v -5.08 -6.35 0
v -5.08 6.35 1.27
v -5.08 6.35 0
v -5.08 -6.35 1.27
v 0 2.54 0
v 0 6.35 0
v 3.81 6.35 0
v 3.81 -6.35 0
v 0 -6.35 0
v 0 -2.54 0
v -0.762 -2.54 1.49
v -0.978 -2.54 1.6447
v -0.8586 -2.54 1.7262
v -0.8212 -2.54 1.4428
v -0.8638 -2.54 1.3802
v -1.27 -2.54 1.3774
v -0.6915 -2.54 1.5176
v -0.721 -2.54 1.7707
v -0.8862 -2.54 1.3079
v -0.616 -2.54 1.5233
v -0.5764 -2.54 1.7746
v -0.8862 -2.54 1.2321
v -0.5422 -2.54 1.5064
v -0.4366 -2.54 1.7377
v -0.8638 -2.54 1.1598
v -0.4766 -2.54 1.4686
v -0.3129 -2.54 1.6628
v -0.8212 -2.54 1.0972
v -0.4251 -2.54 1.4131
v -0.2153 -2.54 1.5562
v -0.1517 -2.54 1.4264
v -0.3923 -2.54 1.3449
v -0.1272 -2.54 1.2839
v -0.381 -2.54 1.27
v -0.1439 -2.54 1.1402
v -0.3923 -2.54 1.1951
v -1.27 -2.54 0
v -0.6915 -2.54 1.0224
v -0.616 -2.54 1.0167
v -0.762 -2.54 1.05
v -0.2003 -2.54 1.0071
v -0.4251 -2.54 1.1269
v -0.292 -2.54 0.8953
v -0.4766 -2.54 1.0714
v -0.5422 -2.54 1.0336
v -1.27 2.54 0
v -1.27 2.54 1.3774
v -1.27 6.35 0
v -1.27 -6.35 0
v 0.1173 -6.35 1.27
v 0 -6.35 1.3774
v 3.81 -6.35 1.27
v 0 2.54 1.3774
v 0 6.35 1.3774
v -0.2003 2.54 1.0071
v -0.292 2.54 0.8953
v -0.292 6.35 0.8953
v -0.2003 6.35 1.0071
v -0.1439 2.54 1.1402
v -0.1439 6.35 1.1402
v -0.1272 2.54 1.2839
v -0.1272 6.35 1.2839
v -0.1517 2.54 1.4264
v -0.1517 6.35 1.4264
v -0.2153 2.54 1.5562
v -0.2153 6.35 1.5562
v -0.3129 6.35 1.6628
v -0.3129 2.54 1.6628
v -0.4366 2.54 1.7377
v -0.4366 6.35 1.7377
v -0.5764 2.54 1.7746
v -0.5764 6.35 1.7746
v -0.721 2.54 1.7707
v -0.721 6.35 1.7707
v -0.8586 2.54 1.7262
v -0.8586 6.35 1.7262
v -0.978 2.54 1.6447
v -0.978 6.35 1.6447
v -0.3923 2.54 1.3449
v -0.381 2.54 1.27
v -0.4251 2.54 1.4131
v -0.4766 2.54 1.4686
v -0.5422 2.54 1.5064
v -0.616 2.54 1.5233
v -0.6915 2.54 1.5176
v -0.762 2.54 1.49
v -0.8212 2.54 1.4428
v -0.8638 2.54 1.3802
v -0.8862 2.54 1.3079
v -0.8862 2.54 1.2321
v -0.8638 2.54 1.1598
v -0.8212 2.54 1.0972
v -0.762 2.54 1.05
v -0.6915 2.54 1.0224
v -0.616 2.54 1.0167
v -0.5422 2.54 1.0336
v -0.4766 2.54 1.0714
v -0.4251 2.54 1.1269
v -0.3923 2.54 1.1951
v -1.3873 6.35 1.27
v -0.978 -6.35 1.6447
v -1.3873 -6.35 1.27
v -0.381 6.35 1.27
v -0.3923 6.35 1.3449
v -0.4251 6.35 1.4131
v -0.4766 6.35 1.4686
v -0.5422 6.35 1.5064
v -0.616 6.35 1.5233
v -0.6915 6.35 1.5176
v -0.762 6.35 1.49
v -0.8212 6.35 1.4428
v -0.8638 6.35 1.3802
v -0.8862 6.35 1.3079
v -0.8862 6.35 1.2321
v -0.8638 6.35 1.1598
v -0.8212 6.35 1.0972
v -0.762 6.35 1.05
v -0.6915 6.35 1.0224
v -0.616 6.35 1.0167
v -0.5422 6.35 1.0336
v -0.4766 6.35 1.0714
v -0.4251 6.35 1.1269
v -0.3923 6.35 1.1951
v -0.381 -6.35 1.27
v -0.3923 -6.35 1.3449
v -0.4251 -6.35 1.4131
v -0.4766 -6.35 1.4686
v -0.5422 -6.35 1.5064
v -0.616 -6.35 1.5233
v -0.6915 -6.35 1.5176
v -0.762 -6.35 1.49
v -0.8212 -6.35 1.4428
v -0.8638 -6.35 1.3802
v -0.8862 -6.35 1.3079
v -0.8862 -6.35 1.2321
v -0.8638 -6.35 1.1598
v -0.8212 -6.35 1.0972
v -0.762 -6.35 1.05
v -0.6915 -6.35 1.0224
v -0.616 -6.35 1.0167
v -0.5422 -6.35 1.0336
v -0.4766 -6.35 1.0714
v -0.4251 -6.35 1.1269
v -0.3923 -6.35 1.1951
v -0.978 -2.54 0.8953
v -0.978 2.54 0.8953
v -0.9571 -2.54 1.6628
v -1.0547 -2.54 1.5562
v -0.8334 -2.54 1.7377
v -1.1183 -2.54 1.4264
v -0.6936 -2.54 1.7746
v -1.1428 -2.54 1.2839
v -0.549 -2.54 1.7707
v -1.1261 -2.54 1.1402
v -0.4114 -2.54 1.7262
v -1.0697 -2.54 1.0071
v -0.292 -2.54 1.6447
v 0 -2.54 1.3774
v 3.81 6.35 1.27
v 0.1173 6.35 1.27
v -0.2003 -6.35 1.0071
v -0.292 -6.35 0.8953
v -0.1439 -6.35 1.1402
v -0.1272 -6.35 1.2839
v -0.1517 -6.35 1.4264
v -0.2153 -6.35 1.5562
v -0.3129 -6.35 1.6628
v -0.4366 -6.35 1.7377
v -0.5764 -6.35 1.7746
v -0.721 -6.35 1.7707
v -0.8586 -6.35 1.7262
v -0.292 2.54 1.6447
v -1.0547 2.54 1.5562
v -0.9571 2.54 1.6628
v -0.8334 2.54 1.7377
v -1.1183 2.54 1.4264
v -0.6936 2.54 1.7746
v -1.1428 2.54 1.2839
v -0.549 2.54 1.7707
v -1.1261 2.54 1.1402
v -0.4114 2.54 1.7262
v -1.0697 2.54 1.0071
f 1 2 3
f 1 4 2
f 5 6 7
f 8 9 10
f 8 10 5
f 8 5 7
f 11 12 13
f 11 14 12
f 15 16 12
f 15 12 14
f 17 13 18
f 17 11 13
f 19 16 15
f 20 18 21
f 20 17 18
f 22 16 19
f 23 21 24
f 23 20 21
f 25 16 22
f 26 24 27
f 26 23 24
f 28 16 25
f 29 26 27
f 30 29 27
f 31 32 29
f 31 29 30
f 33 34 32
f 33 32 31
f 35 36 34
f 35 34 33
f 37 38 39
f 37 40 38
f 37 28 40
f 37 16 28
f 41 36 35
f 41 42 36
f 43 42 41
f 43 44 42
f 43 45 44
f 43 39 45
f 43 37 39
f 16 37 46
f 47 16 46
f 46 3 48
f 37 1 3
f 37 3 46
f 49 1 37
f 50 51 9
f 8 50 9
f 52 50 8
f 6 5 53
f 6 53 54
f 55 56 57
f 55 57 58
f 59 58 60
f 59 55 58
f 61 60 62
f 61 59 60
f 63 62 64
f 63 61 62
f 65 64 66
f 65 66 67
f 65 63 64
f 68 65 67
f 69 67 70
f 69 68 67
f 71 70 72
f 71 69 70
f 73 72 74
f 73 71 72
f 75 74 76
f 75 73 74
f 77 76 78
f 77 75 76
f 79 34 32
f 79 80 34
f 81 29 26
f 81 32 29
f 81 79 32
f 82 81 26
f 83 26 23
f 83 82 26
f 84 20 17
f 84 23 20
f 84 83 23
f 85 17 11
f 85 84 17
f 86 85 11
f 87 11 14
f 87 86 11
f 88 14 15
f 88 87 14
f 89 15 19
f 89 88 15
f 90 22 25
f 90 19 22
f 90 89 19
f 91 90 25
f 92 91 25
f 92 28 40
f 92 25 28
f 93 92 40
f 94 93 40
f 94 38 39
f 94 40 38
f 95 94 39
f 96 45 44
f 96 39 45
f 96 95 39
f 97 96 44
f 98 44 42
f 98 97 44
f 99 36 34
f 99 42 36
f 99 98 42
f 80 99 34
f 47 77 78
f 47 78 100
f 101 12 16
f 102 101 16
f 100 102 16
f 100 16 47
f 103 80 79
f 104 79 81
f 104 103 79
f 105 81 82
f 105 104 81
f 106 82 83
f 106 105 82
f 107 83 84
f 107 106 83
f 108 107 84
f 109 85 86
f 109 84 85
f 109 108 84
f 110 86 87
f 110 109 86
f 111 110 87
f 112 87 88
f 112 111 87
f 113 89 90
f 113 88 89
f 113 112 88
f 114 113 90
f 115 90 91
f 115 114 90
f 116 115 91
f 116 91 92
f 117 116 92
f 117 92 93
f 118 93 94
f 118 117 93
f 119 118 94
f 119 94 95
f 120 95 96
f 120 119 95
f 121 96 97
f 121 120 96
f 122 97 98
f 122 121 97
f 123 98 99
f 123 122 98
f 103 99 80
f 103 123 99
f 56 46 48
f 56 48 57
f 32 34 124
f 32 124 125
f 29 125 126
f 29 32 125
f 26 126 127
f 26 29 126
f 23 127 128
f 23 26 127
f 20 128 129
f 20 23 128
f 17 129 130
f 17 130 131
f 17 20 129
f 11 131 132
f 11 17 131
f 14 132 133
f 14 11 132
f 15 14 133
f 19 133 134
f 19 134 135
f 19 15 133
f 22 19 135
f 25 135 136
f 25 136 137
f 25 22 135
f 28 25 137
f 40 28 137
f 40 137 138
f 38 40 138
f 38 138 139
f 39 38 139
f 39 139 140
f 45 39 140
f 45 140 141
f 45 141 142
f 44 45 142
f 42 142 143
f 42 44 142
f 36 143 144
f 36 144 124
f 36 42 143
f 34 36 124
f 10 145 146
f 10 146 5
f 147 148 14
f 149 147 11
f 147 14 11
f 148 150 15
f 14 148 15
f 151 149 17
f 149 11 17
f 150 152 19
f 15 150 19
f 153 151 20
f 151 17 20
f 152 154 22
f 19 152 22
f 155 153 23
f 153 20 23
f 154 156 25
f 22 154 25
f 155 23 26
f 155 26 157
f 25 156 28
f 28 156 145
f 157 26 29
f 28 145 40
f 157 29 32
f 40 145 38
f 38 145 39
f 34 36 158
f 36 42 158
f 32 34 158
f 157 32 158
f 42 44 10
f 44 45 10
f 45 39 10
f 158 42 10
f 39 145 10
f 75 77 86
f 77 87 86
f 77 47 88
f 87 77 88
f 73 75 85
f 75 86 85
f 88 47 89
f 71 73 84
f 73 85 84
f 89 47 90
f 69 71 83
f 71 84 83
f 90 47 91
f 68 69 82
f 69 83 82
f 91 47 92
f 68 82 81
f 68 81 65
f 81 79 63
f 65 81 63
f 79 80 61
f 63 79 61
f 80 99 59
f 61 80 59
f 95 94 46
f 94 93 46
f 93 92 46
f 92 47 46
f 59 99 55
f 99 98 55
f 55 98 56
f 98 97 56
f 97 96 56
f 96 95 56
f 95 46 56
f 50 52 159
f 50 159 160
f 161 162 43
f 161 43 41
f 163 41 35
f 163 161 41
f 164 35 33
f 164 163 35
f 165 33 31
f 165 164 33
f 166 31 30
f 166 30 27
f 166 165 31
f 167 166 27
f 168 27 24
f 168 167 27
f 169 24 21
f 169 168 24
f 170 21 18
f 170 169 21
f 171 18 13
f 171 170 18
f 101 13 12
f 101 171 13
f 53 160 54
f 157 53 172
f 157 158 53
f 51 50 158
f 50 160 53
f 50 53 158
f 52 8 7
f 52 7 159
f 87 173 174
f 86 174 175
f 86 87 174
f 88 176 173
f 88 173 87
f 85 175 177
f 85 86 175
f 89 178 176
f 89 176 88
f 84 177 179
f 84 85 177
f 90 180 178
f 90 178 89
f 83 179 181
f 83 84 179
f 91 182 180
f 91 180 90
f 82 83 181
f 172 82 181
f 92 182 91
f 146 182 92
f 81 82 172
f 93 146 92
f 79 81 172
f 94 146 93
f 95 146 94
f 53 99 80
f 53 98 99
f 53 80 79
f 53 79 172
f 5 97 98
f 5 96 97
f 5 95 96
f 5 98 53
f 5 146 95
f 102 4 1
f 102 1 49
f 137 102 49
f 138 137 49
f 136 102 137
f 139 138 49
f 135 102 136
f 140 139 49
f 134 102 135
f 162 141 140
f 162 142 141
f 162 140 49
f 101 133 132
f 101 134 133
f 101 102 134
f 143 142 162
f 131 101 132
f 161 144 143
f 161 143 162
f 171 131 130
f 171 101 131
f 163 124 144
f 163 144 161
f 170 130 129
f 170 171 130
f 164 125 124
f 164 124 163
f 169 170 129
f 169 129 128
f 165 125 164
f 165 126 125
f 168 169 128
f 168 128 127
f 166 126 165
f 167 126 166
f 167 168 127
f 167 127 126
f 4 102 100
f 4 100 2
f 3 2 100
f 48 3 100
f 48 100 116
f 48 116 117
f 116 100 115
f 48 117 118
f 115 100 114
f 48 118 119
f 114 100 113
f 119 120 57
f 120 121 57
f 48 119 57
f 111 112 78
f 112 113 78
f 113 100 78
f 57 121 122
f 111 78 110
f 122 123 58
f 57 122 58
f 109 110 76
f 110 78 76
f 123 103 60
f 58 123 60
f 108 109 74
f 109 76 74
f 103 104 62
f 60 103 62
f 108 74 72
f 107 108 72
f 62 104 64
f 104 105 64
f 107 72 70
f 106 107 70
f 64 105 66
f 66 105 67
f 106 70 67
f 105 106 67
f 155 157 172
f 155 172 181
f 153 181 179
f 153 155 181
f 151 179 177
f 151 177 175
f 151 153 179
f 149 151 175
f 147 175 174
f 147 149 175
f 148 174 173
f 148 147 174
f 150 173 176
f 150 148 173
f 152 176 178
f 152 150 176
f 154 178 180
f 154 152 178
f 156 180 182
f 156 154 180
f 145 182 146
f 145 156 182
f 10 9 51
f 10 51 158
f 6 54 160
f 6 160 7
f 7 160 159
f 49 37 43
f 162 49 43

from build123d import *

# Parameters (mm, degrees)
F0_R     = 0.254
F1_DEPTH = 6.35
F2_R     = 0.254
F3_DEPTH = 6.35
F4_W     = 1.27
F4_H     = 5.08
F5_DEPTH = 1.779
F4_H_2   = 6.35
F6_DEPTH = 1.779


with BuildPart() as f1:
    # F0 (on Front) → F1 (new body, symmetric)
    with BuildSketch(Plane.XZ):
        with BuildLine():
            Line((-0.9780140565, 0.8952929717), (0, 0))
            Line((0, 0), (3.81, 0))
            Line((3.81, 0), (3.81, 1.27))
            Line((3.81, 1.27), (0.117342346, 1.27))
            Line((0.117342346, 1.27), (-0.2919859435, 1.6447070283))
            ThreePointArc((-0.2919859435, 1.6447070283), (-0.1700725106, 1.4747105997), (-0.127, 1.27))
            ThreePointArc((-0.127, 1.27), (-0.4302894003, 0.8050725106), (-0.9780140565, 0.8952929717))
        make_face()
        with BuildLine():
            ThreePointArc((-0.2919859435, 1.6447070283), (-1.0097070283, 1.6130140565), (-0.9780140565, 0.8952929717))
            ThreePointArc((-0.9780140565, 0.8952929717), (-0.4302894003, 0.8050725106), (-0.127, 1.27))
            ThreePointArc((-0.127, 1.27), (-0.1700725106, 1.4747105997), (-0.2919859435, 1.6447070283))
        make_face()
        with Locations((-0.635, 1.27)):
            Circle(F0_R, mode=Mode.SUBTRACT)
    extrude(amount=F1_DEPTH, both=True)

    # F4 (on Top) → F6 (cut, through all)
    with BuildSketch(Plane.XY):
        with Locations((-0.635, 5.715)):
            Rectangle(F4_W, F4_H_2)
        with Locations((-0.635, -5.715)):
            Rectangle(F4_W, F4_H_2)
    extrude(amount=F6_DEPTH, mode=Mode.SUBTRACT)


with BuildPart() as f3:
    # F2 (on Front) → F3 (new body, symmetric)
    with BuildSketch(Plane.XZ):
        with BuildLine():
            Line((-1.27, 0), (-0.2919859435, 0.8952929717))
            ThreePointArc((-0.2919859435, 0.8952929717), (-0.2602929717, 1.6130140565), (-0.9780140565, 1.6447070283))
            Line((-0.9780140565, 1.6447070283), (-1.387342346, 1.27))
            Line((-1.387342346, 1.27), (-5.08, 1.27))
            Line((-5.08, 1.27), (-5.08, 0))
            Line((-5.08, 0), (-1.27, 0))
        make_face()
        with Locations((-0.635, 1.27)):
            Circle(F2_R, mode=Mode.SUBTRACT)
    extrude(amount=F3_DEPTH, both=True)

    # F4 (on Top) → F5 (cut, through all)
    with BuildSketch(Plane.XY):
        with Locations((-0.635, 0)):
            Rectangle(F4_W, F4_H)
    extrude(amount=F5_DEPTH, mode=Mode.SUBTRACT)


solid = Compound([f1.part, f3.part])
